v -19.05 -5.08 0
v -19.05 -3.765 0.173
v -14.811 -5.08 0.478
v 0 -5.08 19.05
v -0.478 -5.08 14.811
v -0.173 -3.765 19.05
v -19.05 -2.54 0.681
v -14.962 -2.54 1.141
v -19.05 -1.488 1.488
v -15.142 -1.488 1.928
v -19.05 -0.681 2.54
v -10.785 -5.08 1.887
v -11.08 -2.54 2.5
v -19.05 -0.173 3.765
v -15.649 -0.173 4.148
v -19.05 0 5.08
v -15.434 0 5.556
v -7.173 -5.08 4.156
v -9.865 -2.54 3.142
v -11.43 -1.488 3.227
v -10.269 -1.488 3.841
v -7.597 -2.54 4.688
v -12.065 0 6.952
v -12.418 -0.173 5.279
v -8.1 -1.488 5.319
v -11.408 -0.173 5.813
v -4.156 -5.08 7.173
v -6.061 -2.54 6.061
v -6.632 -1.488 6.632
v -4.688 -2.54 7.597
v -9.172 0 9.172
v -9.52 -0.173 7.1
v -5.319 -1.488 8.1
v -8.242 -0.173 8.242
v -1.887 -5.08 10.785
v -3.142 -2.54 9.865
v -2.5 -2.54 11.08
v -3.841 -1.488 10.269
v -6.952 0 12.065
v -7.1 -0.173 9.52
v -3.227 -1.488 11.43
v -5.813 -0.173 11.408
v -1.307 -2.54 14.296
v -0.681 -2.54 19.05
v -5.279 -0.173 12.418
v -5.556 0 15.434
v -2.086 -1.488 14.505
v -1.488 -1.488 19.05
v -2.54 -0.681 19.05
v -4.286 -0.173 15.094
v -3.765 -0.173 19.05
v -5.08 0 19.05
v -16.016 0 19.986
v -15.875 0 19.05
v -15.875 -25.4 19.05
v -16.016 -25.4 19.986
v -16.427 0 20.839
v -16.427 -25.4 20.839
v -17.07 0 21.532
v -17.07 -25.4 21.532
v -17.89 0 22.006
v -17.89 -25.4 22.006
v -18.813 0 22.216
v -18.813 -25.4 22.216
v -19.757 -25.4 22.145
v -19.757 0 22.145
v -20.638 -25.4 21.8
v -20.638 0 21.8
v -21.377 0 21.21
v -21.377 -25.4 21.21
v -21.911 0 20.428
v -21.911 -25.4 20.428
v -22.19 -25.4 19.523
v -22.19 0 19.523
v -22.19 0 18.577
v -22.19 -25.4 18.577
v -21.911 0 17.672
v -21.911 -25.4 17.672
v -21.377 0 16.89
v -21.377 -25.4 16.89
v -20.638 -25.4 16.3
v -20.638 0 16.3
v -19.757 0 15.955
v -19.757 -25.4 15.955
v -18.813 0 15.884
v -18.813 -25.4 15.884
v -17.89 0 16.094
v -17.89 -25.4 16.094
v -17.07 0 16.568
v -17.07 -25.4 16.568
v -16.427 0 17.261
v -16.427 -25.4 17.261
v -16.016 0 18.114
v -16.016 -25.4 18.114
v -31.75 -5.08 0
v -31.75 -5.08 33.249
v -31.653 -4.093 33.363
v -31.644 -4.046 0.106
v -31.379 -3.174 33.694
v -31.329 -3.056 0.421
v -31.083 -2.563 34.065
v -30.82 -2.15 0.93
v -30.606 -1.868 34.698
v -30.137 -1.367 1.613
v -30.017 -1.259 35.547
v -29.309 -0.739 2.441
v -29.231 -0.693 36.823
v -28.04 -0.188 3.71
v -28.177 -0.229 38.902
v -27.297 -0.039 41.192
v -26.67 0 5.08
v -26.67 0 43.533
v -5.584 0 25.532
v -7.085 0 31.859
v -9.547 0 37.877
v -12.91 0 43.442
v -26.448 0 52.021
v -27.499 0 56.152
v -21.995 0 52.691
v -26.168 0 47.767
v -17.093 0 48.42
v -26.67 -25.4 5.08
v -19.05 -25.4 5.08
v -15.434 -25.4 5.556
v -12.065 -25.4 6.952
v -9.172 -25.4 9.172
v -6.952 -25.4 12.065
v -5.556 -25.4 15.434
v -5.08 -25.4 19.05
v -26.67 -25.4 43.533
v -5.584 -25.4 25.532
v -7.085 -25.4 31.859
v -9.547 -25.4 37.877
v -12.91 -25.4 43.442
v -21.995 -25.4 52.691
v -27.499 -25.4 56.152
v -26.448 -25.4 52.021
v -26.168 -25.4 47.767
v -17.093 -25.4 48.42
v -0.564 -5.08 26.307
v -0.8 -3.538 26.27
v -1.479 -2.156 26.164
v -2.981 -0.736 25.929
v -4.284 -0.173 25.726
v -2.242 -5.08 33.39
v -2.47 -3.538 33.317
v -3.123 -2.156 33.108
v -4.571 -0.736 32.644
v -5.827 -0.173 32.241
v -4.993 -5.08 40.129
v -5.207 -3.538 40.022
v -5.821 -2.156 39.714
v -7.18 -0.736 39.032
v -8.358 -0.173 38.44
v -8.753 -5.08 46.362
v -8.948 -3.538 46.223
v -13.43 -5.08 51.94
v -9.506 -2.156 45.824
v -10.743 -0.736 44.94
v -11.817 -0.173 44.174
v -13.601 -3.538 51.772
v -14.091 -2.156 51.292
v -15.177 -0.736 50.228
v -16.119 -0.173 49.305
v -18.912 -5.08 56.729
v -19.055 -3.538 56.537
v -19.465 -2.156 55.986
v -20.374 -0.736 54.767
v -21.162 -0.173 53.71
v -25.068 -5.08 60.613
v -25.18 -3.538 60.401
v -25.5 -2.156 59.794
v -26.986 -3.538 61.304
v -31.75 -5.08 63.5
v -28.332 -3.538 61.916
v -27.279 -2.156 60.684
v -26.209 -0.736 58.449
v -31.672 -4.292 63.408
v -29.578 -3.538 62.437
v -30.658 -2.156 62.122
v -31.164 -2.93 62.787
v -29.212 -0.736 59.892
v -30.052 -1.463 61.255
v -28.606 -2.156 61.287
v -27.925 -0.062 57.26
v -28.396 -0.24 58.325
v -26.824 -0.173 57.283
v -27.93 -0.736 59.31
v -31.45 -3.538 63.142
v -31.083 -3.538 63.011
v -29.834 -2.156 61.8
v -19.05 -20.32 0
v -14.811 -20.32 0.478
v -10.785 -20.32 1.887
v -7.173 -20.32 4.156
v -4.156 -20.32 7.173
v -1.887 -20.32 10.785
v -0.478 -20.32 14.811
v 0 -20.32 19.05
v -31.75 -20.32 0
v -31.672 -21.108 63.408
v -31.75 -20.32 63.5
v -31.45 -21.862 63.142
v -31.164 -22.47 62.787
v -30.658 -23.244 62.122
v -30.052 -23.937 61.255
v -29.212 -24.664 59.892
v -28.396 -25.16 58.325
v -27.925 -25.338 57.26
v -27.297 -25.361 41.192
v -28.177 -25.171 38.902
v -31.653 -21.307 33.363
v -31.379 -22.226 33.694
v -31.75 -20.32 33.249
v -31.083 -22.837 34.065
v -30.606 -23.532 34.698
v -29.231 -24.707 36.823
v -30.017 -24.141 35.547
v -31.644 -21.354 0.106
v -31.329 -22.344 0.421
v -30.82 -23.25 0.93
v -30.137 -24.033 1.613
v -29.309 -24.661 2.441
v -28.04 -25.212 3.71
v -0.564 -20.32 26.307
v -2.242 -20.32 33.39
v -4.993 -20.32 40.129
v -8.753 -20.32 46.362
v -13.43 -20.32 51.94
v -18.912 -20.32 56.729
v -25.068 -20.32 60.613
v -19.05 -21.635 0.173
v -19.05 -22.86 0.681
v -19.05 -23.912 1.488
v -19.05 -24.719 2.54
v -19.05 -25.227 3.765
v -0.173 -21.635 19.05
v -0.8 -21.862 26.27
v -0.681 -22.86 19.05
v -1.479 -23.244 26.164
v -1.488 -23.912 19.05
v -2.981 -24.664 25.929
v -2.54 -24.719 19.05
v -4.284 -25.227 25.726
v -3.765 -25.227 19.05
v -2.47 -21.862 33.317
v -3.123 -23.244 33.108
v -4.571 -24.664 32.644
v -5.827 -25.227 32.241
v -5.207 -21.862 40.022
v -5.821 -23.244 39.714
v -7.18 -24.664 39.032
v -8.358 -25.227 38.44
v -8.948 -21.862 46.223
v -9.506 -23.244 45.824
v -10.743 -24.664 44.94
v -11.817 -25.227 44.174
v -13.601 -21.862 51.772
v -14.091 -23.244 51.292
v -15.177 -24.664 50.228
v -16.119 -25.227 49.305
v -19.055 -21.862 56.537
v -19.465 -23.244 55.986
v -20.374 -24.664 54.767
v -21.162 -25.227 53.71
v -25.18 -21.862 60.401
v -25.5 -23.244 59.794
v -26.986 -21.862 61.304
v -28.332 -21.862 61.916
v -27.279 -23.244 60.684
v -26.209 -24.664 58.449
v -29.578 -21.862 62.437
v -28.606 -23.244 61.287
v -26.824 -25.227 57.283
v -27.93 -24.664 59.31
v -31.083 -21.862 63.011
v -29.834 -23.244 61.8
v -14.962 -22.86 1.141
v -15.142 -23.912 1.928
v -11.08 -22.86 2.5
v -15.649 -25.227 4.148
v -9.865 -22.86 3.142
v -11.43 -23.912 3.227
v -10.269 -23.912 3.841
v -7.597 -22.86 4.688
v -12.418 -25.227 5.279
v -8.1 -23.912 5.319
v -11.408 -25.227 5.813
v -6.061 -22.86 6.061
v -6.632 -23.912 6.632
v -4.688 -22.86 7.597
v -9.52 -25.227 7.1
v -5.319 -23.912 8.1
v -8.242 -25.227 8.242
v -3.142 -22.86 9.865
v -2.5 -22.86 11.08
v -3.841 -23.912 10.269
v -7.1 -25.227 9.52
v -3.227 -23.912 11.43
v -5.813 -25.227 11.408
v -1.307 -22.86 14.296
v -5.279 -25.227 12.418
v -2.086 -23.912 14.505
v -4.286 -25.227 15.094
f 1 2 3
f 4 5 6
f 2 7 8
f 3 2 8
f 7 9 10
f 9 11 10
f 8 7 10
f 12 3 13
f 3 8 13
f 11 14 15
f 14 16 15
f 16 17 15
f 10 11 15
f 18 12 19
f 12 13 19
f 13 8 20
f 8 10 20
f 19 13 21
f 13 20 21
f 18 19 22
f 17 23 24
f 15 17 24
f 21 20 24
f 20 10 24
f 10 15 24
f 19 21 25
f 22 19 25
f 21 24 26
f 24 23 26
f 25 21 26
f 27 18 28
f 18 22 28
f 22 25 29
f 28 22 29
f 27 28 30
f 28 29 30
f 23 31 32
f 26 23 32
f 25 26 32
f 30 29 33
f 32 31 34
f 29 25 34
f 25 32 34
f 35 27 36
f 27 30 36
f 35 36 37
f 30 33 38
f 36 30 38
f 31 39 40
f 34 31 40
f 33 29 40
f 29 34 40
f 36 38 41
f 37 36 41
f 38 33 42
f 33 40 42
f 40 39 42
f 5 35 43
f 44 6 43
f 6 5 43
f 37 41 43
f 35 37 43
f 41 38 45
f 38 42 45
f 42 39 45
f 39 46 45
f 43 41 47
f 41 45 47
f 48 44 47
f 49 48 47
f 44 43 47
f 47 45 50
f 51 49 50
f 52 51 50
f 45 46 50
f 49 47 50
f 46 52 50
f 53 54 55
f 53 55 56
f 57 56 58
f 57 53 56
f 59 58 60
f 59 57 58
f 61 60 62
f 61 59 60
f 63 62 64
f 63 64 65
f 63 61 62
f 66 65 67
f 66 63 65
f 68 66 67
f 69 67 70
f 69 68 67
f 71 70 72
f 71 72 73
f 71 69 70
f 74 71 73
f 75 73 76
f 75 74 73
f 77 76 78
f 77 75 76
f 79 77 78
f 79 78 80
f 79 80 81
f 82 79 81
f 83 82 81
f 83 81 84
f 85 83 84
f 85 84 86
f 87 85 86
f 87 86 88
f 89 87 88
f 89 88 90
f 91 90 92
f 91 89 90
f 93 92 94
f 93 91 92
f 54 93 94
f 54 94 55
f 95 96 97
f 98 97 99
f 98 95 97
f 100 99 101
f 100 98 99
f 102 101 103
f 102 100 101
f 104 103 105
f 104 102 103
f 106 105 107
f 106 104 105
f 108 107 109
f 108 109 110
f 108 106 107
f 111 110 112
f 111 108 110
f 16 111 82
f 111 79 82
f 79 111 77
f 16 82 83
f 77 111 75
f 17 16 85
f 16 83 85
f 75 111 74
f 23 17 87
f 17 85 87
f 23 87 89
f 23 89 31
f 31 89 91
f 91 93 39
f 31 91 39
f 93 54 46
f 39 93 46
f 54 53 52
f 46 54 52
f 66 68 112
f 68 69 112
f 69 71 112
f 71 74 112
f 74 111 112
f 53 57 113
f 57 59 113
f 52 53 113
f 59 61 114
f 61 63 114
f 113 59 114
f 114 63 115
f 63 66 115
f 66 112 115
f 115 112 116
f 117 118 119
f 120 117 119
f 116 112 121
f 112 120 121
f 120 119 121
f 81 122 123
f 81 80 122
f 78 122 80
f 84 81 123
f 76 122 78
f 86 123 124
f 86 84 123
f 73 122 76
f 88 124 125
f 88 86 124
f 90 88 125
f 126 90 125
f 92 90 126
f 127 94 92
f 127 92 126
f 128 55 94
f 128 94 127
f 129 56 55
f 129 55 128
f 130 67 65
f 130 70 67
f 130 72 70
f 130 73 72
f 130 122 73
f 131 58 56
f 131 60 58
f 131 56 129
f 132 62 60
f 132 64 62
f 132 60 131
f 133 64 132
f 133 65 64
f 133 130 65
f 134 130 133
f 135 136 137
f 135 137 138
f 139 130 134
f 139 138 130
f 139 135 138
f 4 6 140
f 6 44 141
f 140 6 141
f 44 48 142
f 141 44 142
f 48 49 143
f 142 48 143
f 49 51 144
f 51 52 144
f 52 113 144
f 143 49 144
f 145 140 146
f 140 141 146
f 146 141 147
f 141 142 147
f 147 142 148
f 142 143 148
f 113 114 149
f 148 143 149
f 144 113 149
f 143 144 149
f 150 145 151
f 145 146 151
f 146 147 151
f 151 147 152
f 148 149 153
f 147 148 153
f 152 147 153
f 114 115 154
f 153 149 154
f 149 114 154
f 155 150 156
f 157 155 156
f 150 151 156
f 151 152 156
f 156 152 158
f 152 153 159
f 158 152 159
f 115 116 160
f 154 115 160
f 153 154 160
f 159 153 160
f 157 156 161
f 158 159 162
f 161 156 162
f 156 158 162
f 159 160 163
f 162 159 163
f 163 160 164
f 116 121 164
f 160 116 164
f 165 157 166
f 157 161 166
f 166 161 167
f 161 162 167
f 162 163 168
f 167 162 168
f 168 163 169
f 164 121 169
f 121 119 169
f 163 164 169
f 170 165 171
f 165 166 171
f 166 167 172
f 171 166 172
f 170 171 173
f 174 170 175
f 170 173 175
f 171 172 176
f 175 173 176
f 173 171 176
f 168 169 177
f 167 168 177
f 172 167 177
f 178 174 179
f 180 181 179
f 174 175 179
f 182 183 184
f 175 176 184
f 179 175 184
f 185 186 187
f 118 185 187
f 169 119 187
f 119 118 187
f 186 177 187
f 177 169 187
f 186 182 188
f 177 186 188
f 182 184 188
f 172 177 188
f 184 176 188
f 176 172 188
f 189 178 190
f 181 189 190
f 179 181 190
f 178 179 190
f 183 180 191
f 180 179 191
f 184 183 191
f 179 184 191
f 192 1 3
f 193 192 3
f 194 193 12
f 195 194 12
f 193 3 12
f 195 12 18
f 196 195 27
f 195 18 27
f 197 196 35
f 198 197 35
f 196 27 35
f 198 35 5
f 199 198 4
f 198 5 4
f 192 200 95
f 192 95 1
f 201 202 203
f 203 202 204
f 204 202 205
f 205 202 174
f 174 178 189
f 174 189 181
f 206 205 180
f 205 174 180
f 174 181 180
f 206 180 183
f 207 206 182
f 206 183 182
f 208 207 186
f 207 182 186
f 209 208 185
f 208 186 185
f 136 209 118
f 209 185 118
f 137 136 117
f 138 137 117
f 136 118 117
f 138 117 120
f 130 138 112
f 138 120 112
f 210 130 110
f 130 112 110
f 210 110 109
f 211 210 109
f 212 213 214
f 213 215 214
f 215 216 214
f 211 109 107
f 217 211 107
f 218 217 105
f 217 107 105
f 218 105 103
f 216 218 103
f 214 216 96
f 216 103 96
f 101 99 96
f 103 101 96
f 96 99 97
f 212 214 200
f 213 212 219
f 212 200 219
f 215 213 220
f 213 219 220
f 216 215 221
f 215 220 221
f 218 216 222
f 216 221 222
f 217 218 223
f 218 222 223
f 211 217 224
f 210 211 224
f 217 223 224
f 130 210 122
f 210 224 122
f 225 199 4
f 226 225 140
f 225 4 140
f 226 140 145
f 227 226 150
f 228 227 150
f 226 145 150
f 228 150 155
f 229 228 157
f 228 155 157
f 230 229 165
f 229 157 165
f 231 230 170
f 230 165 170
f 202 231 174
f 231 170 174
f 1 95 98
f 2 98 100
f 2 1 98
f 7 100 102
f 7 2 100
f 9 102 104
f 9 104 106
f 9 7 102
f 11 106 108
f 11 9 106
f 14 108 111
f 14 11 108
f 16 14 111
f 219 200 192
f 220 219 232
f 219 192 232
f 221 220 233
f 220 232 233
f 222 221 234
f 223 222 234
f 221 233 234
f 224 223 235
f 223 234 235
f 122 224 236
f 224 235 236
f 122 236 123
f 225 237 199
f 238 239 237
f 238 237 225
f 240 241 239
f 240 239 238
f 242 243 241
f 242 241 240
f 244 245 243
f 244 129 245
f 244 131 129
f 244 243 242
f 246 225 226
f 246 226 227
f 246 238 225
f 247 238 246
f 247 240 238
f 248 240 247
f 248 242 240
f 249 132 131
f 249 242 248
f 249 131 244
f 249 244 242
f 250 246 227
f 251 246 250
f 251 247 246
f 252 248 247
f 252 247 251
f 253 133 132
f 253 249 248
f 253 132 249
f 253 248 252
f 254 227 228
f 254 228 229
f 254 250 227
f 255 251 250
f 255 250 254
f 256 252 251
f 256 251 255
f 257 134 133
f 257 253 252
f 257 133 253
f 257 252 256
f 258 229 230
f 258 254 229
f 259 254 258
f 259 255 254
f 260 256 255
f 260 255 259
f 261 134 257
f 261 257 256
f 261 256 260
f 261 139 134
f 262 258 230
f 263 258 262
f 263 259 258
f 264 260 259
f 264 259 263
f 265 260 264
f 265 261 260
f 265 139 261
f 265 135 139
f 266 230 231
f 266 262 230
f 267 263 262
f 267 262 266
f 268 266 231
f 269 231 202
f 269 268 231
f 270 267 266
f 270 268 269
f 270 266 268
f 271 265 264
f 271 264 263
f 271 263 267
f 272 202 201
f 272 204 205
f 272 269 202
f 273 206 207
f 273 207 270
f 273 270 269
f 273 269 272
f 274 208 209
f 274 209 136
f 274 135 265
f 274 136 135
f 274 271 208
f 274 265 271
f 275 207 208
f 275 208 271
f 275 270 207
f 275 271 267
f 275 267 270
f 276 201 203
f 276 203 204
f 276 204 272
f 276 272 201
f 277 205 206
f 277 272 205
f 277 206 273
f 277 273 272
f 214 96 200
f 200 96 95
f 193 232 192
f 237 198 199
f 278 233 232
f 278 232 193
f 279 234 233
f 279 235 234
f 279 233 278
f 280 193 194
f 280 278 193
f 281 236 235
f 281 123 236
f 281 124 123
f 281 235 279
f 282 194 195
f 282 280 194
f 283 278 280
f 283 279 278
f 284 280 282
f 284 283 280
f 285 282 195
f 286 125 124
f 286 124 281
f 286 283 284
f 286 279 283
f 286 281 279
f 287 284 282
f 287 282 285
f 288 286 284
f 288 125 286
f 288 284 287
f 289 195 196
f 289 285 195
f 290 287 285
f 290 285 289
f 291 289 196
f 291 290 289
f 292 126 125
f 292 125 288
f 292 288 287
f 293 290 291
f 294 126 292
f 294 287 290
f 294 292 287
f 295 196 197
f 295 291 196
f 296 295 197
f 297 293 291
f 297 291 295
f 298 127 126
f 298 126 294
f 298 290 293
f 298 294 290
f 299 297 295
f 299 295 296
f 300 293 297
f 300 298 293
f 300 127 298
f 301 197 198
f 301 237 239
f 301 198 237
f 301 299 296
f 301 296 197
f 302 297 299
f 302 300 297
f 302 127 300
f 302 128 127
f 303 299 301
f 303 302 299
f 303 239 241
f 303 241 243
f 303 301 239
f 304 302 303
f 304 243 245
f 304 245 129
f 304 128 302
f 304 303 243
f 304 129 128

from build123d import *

# Parameters (mm, degrees)
F0_R     = 3.175
F1_DEPTH = 25.4
F2_R     = 5.08
F3_R     = 5.08


with BuildPart() as f1:
    # F0 (on Front) → F1 (new body)
    with BuildSketch(Plane.XZ):
        with BuildLine():
            Line((-31.75, 0), (-19.05, 0))
            ThreePointArc((-19.05, 0), (-5.579616, 5.579616), (0, 19.05))
            ThreePointArc((0, 19.05), (-11.27287, 36.440191), (-31.75, 33.249032))
            Line((-31.75, 33.249032), (-31.75, 0))
        make_face()
        with Locations((-19.05, 19.05)):
            Circle(F0_R, mode=Mode.SUBTRACT)
        with BuildLine():
            ThreePointArc((-31.75, 33.249032), (-11.27287, 36.440191), (0, 19.05))
            ThreePointArc((0, 19.05), (-8.752664, 46.362383), (-31.75, 63.5))
            ThreePointArc((-31.75, 63.5), (-26.160526, 48.374516), (-31.75, 33.249032))
        make_face()
    extrude(amount=F1_DEPTH)

    # F2
    f2_edges = [f1.edges().sort_by_distance(p)[0] for p in [
        (-31.75, -25.4, 16.624516),
        (-25.4, -25.4, 0),
    ]]
    fillet(f2_edges, radius=F2_R)

    # F3
    f3_edges = [f1.edges().sort_by_distance(p)[0] for p in [
        (-31.75, 0, 16.624516),
        (-25.4, 0, 0),
    ]]
    fillet(f3_edges, radius=F3_R)


solid = f1.part
